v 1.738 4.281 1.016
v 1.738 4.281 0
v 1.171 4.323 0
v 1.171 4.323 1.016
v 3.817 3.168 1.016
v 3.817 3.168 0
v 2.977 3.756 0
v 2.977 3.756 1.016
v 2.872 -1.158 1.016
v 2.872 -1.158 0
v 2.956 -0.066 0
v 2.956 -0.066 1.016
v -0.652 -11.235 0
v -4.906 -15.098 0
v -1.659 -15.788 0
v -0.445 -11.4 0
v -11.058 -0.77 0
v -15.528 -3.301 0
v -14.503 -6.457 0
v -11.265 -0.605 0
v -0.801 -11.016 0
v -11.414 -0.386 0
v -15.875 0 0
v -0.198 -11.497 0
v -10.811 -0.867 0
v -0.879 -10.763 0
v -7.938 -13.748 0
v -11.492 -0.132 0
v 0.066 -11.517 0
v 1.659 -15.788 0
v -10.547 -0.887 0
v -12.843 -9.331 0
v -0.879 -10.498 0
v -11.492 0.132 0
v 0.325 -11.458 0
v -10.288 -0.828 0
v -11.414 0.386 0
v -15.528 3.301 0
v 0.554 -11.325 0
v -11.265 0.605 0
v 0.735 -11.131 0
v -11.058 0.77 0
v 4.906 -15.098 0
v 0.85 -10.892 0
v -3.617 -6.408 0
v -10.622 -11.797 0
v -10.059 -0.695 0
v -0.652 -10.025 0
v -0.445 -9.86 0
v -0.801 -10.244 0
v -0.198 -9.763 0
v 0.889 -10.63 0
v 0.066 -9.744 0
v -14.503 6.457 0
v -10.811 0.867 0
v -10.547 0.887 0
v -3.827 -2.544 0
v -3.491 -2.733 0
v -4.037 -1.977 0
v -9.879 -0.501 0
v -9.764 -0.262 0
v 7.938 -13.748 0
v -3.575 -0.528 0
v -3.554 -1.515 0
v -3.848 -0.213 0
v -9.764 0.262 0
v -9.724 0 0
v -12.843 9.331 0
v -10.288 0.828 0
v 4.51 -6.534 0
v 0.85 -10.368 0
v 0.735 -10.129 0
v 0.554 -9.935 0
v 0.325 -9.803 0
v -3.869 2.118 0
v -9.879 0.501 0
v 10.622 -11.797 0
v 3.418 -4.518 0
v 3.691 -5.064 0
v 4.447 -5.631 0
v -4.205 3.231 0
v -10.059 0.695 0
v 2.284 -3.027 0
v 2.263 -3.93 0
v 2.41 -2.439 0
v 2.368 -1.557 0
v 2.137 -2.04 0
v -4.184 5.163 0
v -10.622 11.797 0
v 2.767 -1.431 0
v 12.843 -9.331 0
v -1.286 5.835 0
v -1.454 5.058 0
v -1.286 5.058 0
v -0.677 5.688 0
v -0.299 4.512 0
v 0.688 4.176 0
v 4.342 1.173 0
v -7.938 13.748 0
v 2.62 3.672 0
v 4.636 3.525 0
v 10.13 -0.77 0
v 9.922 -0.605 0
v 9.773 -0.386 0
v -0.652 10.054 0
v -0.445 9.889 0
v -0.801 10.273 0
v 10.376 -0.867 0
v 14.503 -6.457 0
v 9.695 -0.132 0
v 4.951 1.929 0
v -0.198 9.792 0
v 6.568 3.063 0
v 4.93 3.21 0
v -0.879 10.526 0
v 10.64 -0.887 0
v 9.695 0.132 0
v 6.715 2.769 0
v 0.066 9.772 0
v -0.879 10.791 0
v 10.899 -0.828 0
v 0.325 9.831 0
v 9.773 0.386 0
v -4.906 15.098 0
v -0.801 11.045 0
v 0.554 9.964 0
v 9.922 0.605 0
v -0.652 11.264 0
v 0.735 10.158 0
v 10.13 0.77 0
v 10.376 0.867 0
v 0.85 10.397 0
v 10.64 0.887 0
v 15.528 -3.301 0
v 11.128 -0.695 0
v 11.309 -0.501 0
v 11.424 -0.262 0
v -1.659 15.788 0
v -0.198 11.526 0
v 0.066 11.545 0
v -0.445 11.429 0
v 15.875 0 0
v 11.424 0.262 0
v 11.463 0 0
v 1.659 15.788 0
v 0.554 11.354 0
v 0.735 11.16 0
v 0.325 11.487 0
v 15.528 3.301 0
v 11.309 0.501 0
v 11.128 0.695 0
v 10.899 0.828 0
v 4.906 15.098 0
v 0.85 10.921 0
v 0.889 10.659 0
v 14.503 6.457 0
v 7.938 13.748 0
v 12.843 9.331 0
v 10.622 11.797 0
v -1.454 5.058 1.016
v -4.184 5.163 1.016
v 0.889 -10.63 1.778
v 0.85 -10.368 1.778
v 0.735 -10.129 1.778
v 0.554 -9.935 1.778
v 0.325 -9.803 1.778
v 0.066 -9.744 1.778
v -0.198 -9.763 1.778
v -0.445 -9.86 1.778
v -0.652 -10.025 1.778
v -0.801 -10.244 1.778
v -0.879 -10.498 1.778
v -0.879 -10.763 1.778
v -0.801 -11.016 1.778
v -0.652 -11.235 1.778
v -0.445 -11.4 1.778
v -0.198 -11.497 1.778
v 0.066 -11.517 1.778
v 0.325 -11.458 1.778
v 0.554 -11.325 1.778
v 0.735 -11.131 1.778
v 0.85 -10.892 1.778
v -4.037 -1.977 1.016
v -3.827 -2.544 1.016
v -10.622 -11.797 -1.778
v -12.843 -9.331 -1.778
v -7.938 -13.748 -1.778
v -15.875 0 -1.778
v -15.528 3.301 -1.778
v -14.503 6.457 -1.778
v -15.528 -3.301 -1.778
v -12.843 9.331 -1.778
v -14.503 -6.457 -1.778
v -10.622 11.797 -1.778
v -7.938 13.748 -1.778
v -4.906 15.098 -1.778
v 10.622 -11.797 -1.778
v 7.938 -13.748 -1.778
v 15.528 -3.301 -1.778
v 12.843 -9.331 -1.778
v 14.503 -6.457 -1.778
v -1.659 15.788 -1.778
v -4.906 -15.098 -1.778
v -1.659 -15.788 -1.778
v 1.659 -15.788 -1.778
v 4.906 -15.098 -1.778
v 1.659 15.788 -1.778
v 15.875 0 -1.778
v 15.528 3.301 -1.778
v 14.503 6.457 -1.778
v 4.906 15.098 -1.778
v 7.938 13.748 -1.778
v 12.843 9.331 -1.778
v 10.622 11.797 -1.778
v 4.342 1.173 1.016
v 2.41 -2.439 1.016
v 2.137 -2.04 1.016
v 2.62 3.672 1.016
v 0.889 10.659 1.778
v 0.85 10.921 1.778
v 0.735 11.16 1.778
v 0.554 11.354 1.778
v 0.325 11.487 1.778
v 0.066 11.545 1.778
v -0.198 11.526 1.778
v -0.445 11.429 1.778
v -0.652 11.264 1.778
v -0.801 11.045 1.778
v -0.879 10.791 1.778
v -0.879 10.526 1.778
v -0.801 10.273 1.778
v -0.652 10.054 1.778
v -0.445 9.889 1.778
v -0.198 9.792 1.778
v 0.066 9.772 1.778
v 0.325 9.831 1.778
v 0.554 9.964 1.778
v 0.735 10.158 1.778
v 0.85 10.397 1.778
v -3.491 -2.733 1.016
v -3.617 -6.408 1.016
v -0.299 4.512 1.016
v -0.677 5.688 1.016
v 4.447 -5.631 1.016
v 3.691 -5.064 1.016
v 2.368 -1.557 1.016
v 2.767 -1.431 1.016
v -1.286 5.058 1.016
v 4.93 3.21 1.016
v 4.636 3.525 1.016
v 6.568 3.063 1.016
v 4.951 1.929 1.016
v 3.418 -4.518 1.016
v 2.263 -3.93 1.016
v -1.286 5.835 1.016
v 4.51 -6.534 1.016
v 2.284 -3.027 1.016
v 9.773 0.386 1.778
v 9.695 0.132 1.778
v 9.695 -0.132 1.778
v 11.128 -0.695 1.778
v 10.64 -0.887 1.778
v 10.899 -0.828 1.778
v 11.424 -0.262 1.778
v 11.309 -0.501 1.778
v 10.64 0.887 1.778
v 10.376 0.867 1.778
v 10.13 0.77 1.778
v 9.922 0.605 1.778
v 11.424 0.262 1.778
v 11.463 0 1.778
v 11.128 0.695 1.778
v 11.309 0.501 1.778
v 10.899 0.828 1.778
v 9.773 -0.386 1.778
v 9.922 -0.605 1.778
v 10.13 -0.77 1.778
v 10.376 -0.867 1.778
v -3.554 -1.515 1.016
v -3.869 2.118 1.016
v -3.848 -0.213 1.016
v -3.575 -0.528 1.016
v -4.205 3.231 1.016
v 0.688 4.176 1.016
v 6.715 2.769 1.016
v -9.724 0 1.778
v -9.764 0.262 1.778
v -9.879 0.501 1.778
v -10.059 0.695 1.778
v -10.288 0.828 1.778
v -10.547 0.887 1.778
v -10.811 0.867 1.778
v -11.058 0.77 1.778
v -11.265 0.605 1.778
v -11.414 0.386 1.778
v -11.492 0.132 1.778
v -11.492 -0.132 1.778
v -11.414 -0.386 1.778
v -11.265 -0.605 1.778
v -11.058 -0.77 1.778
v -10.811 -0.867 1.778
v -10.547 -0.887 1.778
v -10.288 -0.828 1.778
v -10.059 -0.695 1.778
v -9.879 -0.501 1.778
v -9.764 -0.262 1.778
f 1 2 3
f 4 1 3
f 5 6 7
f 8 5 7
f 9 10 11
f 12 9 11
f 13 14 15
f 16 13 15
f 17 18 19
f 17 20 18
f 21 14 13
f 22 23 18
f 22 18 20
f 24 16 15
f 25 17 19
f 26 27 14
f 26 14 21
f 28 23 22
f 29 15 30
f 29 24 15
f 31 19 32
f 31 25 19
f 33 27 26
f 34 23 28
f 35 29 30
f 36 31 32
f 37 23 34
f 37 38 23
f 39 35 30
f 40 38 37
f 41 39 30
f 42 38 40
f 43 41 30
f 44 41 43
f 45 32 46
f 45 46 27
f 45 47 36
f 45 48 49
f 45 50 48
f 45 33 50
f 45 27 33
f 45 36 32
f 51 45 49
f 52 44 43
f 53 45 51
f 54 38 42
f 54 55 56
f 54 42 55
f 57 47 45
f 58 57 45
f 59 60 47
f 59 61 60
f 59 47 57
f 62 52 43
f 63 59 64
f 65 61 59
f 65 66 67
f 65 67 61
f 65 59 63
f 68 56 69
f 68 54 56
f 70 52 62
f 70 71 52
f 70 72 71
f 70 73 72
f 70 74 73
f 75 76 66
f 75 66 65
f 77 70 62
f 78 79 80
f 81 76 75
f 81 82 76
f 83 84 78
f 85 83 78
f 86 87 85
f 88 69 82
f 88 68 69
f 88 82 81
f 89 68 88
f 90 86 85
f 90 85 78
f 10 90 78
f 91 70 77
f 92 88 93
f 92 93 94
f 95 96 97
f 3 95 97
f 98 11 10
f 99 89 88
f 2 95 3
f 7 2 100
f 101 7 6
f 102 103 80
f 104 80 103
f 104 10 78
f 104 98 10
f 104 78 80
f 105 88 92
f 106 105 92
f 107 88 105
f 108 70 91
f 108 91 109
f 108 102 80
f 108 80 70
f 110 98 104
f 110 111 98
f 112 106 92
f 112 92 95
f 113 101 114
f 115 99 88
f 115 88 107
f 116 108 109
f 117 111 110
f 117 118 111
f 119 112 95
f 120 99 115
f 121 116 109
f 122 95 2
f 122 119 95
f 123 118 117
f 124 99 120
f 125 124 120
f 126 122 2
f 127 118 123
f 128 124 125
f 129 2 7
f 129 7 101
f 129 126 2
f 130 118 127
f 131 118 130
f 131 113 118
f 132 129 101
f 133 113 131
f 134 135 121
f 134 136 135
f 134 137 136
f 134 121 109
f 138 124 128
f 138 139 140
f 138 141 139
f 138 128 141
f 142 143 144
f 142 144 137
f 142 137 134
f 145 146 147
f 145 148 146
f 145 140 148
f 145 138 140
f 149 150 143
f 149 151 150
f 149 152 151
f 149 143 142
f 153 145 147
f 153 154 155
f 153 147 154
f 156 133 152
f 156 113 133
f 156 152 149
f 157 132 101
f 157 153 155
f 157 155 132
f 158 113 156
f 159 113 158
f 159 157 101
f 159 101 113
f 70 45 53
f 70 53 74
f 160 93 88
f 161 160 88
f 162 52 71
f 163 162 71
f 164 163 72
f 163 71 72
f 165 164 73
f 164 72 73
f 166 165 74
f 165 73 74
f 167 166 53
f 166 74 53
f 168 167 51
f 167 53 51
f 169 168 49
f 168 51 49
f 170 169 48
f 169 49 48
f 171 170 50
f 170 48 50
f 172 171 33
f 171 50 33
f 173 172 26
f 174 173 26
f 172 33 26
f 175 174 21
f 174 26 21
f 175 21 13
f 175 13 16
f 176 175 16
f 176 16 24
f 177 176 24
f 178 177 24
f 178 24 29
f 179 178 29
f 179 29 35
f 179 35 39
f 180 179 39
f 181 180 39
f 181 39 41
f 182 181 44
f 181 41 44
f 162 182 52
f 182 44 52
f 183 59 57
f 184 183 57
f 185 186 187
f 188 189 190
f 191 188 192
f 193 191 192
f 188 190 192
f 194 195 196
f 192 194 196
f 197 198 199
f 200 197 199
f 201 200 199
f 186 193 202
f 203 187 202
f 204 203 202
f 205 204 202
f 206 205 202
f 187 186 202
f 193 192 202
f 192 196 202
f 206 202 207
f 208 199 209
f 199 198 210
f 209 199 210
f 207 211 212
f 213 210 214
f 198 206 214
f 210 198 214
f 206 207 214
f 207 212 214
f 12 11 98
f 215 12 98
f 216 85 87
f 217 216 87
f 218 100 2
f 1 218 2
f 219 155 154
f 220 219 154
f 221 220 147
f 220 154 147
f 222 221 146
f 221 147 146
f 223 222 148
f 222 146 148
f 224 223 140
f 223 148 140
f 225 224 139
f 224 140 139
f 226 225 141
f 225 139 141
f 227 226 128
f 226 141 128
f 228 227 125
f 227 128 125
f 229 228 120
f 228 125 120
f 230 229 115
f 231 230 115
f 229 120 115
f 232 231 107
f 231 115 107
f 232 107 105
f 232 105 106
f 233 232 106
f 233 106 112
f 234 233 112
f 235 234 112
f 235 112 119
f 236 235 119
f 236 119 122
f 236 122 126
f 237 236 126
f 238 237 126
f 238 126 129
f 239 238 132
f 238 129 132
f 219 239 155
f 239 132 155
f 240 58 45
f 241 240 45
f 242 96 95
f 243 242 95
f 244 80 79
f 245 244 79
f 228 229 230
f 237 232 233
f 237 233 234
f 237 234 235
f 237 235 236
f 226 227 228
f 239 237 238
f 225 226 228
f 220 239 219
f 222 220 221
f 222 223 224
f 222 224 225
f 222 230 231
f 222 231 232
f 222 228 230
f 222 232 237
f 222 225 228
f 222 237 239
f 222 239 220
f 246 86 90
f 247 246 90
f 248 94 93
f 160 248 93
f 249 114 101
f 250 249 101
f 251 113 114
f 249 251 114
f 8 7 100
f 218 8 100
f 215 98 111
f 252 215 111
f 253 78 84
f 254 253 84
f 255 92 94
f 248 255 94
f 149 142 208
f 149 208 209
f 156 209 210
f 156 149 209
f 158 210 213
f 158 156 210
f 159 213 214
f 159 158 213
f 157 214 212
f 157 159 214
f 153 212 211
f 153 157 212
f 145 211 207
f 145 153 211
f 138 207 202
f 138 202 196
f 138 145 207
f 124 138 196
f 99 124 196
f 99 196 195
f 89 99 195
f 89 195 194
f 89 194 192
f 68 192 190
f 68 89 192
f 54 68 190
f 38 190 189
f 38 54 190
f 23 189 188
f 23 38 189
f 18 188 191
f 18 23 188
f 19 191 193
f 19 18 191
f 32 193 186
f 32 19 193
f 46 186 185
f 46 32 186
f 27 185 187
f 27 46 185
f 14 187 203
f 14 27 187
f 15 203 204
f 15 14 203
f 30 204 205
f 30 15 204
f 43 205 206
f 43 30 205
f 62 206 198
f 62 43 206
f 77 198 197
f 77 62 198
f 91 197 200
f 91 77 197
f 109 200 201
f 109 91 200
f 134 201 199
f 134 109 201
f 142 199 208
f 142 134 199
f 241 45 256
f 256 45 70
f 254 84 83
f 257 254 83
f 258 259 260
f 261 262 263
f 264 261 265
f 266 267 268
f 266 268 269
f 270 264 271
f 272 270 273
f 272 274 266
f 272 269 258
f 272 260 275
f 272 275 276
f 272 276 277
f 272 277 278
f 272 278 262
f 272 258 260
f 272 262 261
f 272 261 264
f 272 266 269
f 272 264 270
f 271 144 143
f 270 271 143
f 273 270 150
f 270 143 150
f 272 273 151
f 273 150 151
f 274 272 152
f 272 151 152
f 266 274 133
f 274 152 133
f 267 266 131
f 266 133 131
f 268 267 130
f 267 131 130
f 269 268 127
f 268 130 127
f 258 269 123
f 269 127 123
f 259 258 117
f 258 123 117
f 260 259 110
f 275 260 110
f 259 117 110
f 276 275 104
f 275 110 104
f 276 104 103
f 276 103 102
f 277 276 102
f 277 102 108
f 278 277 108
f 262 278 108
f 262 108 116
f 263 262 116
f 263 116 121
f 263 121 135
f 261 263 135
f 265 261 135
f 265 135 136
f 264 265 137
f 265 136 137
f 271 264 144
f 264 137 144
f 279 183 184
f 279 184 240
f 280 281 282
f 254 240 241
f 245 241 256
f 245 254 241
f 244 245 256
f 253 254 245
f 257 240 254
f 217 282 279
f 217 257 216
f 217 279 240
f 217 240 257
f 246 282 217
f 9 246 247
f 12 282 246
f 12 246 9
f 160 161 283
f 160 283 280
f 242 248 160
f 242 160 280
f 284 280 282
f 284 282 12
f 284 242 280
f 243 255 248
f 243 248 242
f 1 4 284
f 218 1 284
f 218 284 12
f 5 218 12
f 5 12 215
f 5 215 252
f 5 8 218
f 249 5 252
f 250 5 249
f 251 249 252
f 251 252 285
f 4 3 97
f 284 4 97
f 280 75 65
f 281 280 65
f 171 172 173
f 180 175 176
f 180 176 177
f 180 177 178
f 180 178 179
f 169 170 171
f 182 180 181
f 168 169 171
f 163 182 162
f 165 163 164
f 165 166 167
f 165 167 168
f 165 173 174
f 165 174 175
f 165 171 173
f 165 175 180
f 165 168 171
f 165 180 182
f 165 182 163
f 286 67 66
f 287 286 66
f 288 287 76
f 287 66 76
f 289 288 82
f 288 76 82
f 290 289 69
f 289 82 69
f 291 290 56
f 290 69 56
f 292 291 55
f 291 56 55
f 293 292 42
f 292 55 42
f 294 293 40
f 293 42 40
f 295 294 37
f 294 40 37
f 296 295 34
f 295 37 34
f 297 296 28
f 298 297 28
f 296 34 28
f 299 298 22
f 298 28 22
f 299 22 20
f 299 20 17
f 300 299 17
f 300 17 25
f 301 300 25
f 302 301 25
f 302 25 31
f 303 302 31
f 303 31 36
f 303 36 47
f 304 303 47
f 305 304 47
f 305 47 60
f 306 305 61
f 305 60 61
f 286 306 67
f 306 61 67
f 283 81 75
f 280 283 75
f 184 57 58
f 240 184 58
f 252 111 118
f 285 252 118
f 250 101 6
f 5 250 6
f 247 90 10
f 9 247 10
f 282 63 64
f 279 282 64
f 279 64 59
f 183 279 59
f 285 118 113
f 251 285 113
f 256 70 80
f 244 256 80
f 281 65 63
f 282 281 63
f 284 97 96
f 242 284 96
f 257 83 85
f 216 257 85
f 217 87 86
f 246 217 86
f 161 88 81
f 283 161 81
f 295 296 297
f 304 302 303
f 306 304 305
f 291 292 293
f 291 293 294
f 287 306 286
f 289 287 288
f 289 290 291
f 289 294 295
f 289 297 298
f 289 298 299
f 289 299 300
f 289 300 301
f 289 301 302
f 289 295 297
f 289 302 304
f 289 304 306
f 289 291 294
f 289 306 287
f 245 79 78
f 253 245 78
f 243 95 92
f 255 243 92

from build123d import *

# Parameters (mm, degrees)
F0_R     = 15.875
F1_DEPTH = 1.778
F4_R     = 0.889
F5_DEPTH = 1.778
F7_DEPTH = 1.016


with BuildPart() as f1:
    # F0 (on Top) → F1 (new body)
    with BuildSketch(Plane.XY):
        Circle(F0_R)
    extrude(amount=-F1_DEPTH)

    # F4 (on face) → F5 (join)
    with BuildSketch(Plane.XY):
        with Locations((0, 10.658966)):
            Circle(F4_R)
        with Locations((-10.613078, 0)):
            Circle(F4_R)
        with Locations((0, -10.630104)):
            Circle(F4_R)
        with Locations((10.574064, 0)):
            Circle(F4_R)
    extrude(amount=F5_DEPTH)

    # F6 (on face) → F7 (join)
    with BuildSketch(Plane.XY):
        Polygon((-1.286464, 5.058349), (-1.454464, 5.058349), (-4.184472, 5.163349), (-4.205472, 3.231343), (-3.869471, 2.11834), (-3.848471, -0.212667), (-3.57547, -0.527667), (-3.55447, -1.51467), (-4.037472, -1.976672), (-3.827471, -2.543673), (-3.49147, -2.732674), (-3.61747, -6.407684), (4.509553, -6.533685), (4.446552, -5.630682), (3.69055, -5.06368), (3.41755, -4.517679), (2.262546, -3.929677), (2.283546, -3.026675), (2.409547, -2.438673), (2.136546, -2.039672), (2.367547, -1.55667), (2.766548, -1.43067), (2.871548, -1.157669), (2.955548, -0.065666), (4.341552, 1.173337), (4.950554, 1.92934), (6.714559, 2.769342), (6.567559, 3.063343), (4.929554, 3.210343), (4.635553, 3.525344), (3.816551, 3.168343), (2.976548, 3.756345), (2.619547, 3.672344), (1.737545, 4.281346), (1.170543, 4.323346), (0.687542, 4.176346), (-0.299461, 4.512347), (-0.677462, 5.68835), (-1.286464, 5.83535), align=None)
    extrude(amount=F7_DEPTH)


solid = f1.part
